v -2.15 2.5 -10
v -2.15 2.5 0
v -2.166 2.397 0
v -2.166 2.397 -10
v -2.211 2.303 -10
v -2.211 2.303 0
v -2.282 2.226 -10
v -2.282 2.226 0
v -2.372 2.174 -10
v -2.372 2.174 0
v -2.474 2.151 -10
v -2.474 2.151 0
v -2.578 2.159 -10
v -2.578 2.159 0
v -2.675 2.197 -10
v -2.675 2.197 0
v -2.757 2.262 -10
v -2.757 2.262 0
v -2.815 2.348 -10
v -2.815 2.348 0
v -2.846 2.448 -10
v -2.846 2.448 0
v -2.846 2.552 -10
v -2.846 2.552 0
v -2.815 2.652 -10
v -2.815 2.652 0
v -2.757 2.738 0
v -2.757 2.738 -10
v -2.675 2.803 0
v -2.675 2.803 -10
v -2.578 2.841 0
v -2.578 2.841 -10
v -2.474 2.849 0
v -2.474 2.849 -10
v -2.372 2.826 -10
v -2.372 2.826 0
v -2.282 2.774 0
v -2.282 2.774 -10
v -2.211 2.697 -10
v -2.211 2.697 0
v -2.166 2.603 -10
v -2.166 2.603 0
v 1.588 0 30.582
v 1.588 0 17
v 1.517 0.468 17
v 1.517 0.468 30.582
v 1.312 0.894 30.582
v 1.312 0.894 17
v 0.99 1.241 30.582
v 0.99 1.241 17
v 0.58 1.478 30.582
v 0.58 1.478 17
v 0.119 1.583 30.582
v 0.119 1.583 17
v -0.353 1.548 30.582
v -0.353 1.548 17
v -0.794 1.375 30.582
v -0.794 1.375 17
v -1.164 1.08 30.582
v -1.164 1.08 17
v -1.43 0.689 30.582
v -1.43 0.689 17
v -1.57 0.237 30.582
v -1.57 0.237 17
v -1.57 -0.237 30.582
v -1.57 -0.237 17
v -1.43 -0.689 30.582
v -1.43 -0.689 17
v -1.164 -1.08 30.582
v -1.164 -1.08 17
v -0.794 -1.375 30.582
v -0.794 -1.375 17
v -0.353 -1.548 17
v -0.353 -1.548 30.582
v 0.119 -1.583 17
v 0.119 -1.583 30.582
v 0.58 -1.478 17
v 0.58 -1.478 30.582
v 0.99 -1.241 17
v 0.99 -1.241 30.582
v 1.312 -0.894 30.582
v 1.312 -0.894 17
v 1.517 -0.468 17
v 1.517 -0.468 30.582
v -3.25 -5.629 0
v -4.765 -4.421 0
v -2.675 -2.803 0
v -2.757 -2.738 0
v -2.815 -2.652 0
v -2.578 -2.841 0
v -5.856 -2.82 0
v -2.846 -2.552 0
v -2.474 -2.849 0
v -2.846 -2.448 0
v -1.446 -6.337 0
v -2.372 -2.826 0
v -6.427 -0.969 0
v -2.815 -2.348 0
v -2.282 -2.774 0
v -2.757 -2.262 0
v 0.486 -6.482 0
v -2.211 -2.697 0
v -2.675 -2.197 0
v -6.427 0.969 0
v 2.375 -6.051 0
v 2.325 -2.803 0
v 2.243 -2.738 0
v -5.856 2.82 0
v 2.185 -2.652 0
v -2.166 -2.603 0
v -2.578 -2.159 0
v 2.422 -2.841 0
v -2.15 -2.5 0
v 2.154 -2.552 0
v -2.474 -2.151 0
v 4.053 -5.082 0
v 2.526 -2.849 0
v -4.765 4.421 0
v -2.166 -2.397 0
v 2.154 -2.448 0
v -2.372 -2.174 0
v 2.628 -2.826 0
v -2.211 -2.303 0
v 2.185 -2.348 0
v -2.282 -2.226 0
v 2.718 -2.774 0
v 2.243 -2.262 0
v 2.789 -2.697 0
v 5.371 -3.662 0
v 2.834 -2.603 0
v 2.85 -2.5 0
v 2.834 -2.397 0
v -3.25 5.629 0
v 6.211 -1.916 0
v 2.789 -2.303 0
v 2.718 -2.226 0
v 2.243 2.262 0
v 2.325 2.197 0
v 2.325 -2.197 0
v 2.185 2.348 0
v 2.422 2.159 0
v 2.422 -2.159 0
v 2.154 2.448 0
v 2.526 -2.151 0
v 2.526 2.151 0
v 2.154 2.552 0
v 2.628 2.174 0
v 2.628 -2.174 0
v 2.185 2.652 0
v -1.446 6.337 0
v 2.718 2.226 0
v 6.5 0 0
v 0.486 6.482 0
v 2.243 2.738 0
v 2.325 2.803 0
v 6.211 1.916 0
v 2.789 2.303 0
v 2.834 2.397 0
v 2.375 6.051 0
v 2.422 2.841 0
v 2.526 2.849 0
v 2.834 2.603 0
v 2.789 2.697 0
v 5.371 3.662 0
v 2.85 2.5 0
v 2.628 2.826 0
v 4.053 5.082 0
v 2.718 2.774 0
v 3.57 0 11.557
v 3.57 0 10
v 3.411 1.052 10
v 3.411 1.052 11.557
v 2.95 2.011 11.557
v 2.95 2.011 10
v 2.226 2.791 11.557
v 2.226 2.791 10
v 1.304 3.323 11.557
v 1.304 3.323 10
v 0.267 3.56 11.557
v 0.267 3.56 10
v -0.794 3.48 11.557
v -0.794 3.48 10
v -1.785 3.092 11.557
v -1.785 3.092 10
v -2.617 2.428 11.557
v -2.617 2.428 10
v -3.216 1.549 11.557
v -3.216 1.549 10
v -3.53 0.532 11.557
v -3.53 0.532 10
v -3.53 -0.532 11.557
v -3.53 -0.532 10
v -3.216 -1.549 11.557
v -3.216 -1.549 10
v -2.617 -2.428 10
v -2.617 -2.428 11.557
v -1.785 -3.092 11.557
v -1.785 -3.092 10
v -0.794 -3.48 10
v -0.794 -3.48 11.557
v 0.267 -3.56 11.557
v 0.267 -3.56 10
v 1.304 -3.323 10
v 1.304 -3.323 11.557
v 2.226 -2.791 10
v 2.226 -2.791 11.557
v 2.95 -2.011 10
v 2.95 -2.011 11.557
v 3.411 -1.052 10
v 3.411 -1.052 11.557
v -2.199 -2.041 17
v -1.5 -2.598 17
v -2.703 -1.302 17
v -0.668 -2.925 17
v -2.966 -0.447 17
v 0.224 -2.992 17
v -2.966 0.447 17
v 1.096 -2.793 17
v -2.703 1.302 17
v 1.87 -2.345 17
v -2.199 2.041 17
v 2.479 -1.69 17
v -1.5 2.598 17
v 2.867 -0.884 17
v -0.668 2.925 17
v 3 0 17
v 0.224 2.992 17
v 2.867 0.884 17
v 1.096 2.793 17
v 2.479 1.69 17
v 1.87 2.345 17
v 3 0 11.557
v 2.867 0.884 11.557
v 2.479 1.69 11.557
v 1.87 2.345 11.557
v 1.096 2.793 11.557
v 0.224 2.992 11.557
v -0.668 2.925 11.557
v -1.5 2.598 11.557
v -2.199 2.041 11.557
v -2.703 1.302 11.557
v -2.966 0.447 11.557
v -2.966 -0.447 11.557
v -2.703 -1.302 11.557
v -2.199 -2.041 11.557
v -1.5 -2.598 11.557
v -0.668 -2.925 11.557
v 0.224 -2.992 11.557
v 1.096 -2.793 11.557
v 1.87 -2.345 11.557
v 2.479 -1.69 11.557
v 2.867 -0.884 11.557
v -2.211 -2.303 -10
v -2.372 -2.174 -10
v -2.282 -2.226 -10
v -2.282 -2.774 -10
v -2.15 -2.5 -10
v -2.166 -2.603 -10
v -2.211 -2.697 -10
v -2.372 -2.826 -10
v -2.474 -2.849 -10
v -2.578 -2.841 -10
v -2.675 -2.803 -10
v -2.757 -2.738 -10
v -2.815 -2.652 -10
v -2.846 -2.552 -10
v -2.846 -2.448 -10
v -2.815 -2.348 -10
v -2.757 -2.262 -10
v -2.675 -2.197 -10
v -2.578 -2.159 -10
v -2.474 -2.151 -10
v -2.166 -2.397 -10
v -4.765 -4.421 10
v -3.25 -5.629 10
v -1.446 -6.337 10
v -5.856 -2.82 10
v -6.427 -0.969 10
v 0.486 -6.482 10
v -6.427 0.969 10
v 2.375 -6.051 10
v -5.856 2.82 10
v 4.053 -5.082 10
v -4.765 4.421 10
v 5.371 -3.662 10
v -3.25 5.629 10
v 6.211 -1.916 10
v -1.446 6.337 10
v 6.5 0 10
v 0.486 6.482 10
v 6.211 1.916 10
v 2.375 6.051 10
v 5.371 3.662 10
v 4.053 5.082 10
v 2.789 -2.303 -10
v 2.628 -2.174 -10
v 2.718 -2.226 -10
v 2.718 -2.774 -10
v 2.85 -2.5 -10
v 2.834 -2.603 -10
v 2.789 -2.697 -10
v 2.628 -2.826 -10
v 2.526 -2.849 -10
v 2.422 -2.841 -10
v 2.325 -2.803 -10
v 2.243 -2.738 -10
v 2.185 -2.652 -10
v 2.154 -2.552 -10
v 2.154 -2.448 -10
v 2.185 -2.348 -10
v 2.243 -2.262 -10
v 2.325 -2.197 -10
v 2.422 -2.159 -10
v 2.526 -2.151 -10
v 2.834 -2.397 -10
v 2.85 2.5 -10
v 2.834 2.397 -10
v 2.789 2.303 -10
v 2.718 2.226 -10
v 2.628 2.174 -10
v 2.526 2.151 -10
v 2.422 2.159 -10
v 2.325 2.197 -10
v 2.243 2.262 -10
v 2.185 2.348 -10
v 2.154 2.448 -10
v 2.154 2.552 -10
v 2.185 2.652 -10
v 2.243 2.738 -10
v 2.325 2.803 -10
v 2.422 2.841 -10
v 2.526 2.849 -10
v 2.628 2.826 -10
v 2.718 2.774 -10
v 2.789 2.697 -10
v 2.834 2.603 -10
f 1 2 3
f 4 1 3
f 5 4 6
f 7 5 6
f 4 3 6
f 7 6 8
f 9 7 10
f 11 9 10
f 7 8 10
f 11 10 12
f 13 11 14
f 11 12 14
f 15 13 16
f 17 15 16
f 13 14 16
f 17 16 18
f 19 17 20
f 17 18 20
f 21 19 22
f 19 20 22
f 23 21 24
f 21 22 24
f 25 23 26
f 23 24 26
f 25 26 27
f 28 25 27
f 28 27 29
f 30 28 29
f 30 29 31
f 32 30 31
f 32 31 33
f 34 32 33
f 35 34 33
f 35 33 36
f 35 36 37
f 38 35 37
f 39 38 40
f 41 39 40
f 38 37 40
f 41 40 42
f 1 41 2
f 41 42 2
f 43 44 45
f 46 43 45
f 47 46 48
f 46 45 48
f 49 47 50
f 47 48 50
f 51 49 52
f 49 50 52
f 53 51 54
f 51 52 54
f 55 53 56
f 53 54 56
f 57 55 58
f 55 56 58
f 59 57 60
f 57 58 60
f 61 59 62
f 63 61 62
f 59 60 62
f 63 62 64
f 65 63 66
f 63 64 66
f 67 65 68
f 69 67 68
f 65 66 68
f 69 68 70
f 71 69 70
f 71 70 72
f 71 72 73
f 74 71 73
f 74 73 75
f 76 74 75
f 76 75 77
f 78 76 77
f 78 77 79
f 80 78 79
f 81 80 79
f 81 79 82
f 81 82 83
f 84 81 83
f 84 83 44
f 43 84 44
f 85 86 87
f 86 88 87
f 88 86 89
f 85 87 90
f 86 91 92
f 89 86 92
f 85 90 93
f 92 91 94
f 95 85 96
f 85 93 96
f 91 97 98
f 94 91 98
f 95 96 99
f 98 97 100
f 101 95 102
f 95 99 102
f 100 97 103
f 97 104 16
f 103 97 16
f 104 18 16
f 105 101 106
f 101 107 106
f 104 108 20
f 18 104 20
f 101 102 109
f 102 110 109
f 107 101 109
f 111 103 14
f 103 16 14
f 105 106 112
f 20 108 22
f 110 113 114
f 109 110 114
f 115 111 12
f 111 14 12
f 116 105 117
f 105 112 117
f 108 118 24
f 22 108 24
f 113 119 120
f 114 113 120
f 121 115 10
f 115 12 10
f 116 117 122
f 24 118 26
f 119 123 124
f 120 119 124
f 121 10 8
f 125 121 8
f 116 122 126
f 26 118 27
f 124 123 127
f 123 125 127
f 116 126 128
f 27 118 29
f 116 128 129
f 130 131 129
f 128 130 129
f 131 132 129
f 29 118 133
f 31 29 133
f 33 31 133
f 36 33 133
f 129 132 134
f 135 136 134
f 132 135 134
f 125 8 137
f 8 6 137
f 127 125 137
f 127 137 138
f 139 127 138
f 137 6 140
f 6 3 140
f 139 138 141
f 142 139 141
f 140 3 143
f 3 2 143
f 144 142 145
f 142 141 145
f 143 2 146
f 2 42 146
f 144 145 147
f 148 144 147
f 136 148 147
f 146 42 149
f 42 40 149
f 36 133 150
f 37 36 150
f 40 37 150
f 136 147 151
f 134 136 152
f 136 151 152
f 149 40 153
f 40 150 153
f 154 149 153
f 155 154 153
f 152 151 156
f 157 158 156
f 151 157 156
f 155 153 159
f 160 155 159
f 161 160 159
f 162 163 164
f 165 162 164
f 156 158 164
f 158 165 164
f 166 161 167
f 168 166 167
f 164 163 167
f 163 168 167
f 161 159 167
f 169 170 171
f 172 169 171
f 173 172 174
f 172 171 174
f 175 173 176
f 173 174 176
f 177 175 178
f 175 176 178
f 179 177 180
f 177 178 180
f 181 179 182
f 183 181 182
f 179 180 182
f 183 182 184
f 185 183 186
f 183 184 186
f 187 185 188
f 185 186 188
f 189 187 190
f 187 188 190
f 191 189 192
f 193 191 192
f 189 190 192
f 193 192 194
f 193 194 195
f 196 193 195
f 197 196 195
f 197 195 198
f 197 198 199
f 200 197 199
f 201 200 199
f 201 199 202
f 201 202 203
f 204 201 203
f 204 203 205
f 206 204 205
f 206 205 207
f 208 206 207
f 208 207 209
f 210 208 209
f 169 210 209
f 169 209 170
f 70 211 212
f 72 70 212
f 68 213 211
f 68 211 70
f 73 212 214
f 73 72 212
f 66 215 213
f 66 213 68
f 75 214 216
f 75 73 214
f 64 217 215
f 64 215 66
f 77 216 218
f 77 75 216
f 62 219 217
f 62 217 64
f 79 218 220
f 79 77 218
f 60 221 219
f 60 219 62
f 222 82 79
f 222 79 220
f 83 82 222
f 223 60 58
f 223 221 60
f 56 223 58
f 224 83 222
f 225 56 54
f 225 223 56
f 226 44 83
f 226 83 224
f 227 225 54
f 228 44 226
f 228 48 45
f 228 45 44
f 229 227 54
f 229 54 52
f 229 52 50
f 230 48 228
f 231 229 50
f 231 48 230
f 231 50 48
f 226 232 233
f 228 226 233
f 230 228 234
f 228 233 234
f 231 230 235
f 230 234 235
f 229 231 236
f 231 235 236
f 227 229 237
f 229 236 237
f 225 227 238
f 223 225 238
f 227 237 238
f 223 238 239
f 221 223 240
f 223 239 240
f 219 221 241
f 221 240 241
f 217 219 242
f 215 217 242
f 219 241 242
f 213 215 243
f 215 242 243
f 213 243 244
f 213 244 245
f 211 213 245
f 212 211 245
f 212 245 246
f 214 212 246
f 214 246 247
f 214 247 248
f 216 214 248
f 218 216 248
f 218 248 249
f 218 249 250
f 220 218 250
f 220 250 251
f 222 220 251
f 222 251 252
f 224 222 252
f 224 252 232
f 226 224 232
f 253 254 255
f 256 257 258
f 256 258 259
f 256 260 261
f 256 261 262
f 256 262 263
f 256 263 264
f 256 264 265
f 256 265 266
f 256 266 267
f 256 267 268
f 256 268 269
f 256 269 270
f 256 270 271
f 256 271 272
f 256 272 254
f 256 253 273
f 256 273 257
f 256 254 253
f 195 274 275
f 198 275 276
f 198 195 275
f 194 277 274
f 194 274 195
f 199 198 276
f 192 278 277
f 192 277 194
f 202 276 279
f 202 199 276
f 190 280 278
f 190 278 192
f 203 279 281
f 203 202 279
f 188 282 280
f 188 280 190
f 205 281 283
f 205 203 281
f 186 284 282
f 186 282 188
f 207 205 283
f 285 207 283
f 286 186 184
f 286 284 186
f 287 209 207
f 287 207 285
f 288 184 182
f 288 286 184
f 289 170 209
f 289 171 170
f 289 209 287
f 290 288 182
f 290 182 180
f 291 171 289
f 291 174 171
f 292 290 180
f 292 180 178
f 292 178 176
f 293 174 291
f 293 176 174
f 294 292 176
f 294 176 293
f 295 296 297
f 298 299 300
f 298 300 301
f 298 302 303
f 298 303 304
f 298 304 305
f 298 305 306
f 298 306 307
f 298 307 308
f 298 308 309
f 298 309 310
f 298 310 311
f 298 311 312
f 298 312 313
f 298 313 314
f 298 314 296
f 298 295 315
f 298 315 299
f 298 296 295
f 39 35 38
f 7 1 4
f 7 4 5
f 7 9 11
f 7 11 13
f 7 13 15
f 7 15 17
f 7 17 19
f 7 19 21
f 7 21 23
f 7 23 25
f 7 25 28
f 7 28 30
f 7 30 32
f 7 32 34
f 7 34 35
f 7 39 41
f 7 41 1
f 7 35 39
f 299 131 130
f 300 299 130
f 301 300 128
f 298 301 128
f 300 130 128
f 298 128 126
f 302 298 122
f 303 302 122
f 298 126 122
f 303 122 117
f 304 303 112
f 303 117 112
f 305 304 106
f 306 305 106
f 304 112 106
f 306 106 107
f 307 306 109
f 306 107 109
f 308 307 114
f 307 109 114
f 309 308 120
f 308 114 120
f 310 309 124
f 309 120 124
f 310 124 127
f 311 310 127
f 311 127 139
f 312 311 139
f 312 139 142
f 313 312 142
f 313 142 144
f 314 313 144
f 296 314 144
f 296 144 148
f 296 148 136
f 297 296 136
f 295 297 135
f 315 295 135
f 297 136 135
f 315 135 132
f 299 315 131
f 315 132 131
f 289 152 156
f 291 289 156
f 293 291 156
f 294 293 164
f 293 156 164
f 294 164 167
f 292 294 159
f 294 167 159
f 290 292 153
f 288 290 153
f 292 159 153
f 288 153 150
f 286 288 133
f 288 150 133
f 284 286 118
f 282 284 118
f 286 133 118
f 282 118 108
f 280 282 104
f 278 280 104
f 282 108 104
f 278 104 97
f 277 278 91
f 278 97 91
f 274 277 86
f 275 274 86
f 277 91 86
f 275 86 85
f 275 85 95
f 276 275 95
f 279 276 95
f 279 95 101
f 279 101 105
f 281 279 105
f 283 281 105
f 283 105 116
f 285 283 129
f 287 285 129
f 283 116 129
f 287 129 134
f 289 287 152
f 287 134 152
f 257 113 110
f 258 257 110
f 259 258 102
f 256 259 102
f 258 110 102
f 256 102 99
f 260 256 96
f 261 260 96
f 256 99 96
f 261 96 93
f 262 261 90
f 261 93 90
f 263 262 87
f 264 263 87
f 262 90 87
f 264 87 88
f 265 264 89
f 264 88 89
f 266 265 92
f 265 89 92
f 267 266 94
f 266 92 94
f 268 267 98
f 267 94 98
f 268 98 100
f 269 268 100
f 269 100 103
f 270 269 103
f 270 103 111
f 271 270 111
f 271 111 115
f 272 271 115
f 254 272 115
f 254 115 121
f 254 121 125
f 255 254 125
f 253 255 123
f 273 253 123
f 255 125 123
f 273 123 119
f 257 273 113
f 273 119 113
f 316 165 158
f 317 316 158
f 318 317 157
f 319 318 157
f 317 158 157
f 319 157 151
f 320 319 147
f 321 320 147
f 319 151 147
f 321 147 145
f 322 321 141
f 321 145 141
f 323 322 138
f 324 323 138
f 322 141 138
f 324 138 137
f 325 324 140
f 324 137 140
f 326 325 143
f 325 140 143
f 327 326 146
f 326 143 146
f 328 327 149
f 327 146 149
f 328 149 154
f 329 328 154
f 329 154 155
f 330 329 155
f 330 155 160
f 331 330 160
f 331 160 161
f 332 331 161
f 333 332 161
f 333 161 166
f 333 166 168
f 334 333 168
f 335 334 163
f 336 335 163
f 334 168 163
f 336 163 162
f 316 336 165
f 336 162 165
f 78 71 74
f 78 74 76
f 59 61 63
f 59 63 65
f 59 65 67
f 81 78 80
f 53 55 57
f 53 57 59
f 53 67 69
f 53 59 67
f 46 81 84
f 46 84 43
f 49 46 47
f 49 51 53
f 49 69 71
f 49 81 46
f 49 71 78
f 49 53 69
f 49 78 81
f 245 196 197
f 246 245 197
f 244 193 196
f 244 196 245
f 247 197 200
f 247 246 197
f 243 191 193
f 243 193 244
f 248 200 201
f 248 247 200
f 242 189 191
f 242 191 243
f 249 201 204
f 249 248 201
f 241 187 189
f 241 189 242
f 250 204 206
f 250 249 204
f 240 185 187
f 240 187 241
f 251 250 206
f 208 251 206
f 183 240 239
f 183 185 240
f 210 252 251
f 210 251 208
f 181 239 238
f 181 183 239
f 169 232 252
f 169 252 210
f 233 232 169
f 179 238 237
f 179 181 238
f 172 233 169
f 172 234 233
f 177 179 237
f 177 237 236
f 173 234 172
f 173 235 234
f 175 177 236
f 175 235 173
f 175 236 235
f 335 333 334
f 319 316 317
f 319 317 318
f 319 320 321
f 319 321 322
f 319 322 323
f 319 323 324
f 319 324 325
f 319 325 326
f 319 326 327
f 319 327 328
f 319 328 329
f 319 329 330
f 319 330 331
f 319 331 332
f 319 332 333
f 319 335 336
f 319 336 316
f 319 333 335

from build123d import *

# Parameters (mm, degrees)
SKETCH1_R           = 6.5
BOSS_EXTRUDE1_DEPTH = 10
SKETCH1_3_R         = 3.57
BOSS_EXTRUDE2_DEPTH = 11.557
SKETCH1_4_R         = 3
BOSS_EXTRUDE3_DEPTH = 17
SKETCH1_5_R         = 1.5875
BOSS_EXTRUDE4_DEPTH = 30.5816
SKETCH2_R           = 0.35
BOSS_EXTRUDE5_DEPTH = 10


with BuildPart() as part:
    # Sketch1 → Boss-Extrude1 (new body)
    with BuildSketch(Plane.XY):
        Circle(SKETCH1_R)
    extrude(amount=BOSS_EXTRUDE1_DEPTH)

    # Sketch1<3> → Boss-Extrude2 (add)
    with BuildSketch(Plane.XY):
        Circle(SKETCH1_3_R)
    extrude(amount=BOSS_EXTRUDE2_DEPTH)

    # Sketch1<4> → Boss-Extrude3 (add)
    with BuildSketch(Plane.XY):
        Circle(SKETCH1_4_R)
    extrude(amount=BOSS_EXTRUDE3_DEPTH)

    # Sketch1<5> → Boss-Extrude4 (add)
    with BuildSketch(Plane.XY):
        Circle(SKETCH1_5_R)
    extrude(amount=BOSS_EXTRUDE4_DEPTH)

    # Sketch2 → Boss-Extrude5 (add)
    with BuildSketch(Plane(origin=(0, 0, 0), x_dir=(-1, 0, 0), z_dir=(0, 0, -1))):
        with Locations((-2.5, 2.5)):
            Circle(SKETCH2_R)
        with Locations((2.5, 2.5)):
            Circle(SKETCH2_R)
        with Locations((2.5, -2.5)):
            Circle(SKETCH2_R)
        with Locations((-2.5, -2.5)):
            Circle(SKETCH2_R)
    extrude(amount=BOSS_EXTRUDE5_DEPTH)


solid = part.part
